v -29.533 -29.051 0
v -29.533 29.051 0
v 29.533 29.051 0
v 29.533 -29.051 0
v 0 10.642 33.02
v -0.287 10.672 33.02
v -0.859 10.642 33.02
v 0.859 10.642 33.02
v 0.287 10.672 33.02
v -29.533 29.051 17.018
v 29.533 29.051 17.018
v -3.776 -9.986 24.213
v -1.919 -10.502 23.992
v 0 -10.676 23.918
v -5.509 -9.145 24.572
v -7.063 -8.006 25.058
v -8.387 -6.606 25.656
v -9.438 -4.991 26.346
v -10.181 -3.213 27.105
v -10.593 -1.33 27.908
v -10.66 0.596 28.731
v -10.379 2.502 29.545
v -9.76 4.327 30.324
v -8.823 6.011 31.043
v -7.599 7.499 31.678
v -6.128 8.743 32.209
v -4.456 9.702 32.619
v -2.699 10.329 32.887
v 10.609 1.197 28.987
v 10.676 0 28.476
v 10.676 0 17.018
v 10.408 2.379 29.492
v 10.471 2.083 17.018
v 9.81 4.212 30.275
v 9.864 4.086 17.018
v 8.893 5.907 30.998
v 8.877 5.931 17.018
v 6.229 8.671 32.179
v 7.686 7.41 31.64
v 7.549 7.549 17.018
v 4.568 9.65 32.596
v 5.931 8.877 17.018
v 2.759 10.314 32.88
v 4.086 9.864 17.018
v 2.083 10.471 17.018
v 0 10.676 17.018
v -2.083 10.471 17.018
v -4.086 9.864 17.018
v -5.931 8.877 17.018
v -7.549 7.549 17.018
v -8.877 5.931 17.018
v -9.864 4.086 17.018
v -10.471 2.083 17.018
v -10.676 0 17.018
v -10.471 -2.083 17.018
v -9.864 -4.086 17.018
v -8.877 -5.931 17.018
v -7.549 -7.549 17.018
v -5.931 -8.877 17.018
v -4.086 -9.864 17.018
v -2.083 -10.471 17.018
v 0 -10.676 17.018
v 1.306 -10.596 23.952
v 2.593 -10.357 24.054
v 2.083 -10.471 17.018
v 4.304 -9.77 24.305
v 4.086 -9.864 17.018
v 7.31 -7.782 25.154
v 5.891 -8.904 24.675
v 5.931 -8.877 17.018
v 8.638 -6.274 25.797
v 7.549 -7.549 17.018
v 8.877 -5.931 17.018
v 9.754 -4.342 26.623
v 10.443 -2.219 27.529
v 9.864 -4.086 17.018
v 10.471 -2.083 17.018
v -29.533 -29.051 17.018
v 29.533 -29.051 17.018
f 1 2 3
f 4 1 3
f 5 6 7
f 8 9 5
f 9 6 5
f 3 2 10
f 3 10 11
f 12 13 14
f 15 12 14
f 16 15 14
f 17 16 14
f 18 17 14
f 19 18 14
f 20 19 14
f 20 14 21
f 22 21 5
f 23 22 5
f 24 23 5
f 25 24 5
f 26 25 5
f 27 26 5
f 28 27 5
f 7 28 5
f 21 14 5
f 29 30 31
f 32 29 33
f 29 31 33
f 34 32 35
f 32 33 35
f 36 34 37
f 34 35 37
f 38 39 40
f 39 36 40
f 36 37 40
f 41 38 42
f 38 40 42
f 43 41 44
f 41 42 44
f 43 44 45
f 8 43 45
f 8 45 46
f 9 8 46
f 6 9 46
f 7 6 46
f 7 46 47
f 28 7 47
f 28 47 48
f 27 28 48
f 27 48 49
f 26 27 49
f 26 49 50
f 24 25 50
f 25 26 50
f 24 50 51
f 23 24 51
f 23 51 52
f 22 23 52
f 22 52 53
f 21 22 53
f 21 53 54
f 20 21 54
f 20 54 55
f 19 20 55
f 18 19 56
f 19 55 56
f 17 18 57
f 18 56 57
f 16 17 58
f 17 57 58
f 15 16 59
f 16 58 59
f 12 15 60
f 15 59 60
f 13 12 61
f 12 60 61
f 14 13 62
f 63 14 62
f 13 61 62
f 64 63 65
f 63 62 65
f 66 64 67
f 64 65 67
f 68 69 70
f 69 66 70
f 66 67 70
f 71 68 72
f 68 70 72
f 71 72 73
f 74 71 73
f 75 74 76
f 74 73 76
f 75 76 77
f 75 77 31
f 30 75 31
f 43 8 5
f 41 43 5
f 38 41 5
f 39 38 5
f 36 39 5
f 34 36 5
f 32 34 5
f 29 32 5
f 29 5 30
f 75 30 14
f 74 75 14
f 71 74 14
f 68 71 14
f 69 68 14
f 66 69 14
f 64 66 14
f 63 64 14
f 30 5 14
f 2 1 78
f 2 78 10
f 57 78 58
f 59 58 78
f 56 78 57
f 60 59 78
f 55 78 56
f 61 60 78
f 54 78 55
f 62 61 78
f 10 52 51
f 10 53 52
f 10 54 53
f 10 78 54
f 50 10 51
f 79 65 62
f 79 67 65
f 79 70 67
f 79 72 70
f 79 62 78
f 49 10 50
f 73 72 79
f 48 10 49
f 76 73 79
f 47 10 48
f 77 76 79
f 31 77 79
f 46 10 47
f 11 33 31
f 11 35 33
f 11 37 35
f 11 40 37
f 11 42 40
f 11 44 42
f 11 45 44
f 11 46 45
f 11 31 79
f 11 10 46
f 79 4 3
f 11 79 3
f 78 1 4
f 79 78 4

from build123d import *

# Parameters (mm, degrees)
F0_W     = 59.06649
F0_H     = 58.101352
F1_DEPTH = 17.018
F2_R     = 10.676277
F3_DEPTH = 16.002
F5_DEPTH = 29.534245
F6_DEPTH = 29.534245


with BuildPart() as f1:
    # F0 (on Top) → F1 (new body)
    with BuildSketch(Plane.XY):
        Rectangle(F0_W, F0_H)
    extrude(amount=F1_DEPTH)

    # F2 (on face) → F3 (join)
    with BuildSketch(Plane.XY.offset(17.018)):
        Circle(F2_R)
    extrude(amount=F3_DEPTH)

    # F4 (on Right) → F5 (cut, through all)
    with BuildSketch(Plane.YZ):
        Polygon((-10.705338, 23.905559), (10.682108, 33.037279), (-10.705338, 33.037279), align=None)
    extrude(amount=-F5_DEPTH, mode=Mode.SUBTRACT)

    # F5_face (on face) → F6 (cut, through all)
    with BuildSketch(Plane(origin=(0, -3.570305, 29.985989), x_dir=(0, 1, 0), z_dir=(-1, 0, 0))):
        Polygon((-7.105972, 6.068022), (-7.105972, -3.034011), (14.211944, -3.034011), align=None)
    extrude(amount=-F6_DEPTH, mode=Mode.SUBTRACT)


solid = f1.part
